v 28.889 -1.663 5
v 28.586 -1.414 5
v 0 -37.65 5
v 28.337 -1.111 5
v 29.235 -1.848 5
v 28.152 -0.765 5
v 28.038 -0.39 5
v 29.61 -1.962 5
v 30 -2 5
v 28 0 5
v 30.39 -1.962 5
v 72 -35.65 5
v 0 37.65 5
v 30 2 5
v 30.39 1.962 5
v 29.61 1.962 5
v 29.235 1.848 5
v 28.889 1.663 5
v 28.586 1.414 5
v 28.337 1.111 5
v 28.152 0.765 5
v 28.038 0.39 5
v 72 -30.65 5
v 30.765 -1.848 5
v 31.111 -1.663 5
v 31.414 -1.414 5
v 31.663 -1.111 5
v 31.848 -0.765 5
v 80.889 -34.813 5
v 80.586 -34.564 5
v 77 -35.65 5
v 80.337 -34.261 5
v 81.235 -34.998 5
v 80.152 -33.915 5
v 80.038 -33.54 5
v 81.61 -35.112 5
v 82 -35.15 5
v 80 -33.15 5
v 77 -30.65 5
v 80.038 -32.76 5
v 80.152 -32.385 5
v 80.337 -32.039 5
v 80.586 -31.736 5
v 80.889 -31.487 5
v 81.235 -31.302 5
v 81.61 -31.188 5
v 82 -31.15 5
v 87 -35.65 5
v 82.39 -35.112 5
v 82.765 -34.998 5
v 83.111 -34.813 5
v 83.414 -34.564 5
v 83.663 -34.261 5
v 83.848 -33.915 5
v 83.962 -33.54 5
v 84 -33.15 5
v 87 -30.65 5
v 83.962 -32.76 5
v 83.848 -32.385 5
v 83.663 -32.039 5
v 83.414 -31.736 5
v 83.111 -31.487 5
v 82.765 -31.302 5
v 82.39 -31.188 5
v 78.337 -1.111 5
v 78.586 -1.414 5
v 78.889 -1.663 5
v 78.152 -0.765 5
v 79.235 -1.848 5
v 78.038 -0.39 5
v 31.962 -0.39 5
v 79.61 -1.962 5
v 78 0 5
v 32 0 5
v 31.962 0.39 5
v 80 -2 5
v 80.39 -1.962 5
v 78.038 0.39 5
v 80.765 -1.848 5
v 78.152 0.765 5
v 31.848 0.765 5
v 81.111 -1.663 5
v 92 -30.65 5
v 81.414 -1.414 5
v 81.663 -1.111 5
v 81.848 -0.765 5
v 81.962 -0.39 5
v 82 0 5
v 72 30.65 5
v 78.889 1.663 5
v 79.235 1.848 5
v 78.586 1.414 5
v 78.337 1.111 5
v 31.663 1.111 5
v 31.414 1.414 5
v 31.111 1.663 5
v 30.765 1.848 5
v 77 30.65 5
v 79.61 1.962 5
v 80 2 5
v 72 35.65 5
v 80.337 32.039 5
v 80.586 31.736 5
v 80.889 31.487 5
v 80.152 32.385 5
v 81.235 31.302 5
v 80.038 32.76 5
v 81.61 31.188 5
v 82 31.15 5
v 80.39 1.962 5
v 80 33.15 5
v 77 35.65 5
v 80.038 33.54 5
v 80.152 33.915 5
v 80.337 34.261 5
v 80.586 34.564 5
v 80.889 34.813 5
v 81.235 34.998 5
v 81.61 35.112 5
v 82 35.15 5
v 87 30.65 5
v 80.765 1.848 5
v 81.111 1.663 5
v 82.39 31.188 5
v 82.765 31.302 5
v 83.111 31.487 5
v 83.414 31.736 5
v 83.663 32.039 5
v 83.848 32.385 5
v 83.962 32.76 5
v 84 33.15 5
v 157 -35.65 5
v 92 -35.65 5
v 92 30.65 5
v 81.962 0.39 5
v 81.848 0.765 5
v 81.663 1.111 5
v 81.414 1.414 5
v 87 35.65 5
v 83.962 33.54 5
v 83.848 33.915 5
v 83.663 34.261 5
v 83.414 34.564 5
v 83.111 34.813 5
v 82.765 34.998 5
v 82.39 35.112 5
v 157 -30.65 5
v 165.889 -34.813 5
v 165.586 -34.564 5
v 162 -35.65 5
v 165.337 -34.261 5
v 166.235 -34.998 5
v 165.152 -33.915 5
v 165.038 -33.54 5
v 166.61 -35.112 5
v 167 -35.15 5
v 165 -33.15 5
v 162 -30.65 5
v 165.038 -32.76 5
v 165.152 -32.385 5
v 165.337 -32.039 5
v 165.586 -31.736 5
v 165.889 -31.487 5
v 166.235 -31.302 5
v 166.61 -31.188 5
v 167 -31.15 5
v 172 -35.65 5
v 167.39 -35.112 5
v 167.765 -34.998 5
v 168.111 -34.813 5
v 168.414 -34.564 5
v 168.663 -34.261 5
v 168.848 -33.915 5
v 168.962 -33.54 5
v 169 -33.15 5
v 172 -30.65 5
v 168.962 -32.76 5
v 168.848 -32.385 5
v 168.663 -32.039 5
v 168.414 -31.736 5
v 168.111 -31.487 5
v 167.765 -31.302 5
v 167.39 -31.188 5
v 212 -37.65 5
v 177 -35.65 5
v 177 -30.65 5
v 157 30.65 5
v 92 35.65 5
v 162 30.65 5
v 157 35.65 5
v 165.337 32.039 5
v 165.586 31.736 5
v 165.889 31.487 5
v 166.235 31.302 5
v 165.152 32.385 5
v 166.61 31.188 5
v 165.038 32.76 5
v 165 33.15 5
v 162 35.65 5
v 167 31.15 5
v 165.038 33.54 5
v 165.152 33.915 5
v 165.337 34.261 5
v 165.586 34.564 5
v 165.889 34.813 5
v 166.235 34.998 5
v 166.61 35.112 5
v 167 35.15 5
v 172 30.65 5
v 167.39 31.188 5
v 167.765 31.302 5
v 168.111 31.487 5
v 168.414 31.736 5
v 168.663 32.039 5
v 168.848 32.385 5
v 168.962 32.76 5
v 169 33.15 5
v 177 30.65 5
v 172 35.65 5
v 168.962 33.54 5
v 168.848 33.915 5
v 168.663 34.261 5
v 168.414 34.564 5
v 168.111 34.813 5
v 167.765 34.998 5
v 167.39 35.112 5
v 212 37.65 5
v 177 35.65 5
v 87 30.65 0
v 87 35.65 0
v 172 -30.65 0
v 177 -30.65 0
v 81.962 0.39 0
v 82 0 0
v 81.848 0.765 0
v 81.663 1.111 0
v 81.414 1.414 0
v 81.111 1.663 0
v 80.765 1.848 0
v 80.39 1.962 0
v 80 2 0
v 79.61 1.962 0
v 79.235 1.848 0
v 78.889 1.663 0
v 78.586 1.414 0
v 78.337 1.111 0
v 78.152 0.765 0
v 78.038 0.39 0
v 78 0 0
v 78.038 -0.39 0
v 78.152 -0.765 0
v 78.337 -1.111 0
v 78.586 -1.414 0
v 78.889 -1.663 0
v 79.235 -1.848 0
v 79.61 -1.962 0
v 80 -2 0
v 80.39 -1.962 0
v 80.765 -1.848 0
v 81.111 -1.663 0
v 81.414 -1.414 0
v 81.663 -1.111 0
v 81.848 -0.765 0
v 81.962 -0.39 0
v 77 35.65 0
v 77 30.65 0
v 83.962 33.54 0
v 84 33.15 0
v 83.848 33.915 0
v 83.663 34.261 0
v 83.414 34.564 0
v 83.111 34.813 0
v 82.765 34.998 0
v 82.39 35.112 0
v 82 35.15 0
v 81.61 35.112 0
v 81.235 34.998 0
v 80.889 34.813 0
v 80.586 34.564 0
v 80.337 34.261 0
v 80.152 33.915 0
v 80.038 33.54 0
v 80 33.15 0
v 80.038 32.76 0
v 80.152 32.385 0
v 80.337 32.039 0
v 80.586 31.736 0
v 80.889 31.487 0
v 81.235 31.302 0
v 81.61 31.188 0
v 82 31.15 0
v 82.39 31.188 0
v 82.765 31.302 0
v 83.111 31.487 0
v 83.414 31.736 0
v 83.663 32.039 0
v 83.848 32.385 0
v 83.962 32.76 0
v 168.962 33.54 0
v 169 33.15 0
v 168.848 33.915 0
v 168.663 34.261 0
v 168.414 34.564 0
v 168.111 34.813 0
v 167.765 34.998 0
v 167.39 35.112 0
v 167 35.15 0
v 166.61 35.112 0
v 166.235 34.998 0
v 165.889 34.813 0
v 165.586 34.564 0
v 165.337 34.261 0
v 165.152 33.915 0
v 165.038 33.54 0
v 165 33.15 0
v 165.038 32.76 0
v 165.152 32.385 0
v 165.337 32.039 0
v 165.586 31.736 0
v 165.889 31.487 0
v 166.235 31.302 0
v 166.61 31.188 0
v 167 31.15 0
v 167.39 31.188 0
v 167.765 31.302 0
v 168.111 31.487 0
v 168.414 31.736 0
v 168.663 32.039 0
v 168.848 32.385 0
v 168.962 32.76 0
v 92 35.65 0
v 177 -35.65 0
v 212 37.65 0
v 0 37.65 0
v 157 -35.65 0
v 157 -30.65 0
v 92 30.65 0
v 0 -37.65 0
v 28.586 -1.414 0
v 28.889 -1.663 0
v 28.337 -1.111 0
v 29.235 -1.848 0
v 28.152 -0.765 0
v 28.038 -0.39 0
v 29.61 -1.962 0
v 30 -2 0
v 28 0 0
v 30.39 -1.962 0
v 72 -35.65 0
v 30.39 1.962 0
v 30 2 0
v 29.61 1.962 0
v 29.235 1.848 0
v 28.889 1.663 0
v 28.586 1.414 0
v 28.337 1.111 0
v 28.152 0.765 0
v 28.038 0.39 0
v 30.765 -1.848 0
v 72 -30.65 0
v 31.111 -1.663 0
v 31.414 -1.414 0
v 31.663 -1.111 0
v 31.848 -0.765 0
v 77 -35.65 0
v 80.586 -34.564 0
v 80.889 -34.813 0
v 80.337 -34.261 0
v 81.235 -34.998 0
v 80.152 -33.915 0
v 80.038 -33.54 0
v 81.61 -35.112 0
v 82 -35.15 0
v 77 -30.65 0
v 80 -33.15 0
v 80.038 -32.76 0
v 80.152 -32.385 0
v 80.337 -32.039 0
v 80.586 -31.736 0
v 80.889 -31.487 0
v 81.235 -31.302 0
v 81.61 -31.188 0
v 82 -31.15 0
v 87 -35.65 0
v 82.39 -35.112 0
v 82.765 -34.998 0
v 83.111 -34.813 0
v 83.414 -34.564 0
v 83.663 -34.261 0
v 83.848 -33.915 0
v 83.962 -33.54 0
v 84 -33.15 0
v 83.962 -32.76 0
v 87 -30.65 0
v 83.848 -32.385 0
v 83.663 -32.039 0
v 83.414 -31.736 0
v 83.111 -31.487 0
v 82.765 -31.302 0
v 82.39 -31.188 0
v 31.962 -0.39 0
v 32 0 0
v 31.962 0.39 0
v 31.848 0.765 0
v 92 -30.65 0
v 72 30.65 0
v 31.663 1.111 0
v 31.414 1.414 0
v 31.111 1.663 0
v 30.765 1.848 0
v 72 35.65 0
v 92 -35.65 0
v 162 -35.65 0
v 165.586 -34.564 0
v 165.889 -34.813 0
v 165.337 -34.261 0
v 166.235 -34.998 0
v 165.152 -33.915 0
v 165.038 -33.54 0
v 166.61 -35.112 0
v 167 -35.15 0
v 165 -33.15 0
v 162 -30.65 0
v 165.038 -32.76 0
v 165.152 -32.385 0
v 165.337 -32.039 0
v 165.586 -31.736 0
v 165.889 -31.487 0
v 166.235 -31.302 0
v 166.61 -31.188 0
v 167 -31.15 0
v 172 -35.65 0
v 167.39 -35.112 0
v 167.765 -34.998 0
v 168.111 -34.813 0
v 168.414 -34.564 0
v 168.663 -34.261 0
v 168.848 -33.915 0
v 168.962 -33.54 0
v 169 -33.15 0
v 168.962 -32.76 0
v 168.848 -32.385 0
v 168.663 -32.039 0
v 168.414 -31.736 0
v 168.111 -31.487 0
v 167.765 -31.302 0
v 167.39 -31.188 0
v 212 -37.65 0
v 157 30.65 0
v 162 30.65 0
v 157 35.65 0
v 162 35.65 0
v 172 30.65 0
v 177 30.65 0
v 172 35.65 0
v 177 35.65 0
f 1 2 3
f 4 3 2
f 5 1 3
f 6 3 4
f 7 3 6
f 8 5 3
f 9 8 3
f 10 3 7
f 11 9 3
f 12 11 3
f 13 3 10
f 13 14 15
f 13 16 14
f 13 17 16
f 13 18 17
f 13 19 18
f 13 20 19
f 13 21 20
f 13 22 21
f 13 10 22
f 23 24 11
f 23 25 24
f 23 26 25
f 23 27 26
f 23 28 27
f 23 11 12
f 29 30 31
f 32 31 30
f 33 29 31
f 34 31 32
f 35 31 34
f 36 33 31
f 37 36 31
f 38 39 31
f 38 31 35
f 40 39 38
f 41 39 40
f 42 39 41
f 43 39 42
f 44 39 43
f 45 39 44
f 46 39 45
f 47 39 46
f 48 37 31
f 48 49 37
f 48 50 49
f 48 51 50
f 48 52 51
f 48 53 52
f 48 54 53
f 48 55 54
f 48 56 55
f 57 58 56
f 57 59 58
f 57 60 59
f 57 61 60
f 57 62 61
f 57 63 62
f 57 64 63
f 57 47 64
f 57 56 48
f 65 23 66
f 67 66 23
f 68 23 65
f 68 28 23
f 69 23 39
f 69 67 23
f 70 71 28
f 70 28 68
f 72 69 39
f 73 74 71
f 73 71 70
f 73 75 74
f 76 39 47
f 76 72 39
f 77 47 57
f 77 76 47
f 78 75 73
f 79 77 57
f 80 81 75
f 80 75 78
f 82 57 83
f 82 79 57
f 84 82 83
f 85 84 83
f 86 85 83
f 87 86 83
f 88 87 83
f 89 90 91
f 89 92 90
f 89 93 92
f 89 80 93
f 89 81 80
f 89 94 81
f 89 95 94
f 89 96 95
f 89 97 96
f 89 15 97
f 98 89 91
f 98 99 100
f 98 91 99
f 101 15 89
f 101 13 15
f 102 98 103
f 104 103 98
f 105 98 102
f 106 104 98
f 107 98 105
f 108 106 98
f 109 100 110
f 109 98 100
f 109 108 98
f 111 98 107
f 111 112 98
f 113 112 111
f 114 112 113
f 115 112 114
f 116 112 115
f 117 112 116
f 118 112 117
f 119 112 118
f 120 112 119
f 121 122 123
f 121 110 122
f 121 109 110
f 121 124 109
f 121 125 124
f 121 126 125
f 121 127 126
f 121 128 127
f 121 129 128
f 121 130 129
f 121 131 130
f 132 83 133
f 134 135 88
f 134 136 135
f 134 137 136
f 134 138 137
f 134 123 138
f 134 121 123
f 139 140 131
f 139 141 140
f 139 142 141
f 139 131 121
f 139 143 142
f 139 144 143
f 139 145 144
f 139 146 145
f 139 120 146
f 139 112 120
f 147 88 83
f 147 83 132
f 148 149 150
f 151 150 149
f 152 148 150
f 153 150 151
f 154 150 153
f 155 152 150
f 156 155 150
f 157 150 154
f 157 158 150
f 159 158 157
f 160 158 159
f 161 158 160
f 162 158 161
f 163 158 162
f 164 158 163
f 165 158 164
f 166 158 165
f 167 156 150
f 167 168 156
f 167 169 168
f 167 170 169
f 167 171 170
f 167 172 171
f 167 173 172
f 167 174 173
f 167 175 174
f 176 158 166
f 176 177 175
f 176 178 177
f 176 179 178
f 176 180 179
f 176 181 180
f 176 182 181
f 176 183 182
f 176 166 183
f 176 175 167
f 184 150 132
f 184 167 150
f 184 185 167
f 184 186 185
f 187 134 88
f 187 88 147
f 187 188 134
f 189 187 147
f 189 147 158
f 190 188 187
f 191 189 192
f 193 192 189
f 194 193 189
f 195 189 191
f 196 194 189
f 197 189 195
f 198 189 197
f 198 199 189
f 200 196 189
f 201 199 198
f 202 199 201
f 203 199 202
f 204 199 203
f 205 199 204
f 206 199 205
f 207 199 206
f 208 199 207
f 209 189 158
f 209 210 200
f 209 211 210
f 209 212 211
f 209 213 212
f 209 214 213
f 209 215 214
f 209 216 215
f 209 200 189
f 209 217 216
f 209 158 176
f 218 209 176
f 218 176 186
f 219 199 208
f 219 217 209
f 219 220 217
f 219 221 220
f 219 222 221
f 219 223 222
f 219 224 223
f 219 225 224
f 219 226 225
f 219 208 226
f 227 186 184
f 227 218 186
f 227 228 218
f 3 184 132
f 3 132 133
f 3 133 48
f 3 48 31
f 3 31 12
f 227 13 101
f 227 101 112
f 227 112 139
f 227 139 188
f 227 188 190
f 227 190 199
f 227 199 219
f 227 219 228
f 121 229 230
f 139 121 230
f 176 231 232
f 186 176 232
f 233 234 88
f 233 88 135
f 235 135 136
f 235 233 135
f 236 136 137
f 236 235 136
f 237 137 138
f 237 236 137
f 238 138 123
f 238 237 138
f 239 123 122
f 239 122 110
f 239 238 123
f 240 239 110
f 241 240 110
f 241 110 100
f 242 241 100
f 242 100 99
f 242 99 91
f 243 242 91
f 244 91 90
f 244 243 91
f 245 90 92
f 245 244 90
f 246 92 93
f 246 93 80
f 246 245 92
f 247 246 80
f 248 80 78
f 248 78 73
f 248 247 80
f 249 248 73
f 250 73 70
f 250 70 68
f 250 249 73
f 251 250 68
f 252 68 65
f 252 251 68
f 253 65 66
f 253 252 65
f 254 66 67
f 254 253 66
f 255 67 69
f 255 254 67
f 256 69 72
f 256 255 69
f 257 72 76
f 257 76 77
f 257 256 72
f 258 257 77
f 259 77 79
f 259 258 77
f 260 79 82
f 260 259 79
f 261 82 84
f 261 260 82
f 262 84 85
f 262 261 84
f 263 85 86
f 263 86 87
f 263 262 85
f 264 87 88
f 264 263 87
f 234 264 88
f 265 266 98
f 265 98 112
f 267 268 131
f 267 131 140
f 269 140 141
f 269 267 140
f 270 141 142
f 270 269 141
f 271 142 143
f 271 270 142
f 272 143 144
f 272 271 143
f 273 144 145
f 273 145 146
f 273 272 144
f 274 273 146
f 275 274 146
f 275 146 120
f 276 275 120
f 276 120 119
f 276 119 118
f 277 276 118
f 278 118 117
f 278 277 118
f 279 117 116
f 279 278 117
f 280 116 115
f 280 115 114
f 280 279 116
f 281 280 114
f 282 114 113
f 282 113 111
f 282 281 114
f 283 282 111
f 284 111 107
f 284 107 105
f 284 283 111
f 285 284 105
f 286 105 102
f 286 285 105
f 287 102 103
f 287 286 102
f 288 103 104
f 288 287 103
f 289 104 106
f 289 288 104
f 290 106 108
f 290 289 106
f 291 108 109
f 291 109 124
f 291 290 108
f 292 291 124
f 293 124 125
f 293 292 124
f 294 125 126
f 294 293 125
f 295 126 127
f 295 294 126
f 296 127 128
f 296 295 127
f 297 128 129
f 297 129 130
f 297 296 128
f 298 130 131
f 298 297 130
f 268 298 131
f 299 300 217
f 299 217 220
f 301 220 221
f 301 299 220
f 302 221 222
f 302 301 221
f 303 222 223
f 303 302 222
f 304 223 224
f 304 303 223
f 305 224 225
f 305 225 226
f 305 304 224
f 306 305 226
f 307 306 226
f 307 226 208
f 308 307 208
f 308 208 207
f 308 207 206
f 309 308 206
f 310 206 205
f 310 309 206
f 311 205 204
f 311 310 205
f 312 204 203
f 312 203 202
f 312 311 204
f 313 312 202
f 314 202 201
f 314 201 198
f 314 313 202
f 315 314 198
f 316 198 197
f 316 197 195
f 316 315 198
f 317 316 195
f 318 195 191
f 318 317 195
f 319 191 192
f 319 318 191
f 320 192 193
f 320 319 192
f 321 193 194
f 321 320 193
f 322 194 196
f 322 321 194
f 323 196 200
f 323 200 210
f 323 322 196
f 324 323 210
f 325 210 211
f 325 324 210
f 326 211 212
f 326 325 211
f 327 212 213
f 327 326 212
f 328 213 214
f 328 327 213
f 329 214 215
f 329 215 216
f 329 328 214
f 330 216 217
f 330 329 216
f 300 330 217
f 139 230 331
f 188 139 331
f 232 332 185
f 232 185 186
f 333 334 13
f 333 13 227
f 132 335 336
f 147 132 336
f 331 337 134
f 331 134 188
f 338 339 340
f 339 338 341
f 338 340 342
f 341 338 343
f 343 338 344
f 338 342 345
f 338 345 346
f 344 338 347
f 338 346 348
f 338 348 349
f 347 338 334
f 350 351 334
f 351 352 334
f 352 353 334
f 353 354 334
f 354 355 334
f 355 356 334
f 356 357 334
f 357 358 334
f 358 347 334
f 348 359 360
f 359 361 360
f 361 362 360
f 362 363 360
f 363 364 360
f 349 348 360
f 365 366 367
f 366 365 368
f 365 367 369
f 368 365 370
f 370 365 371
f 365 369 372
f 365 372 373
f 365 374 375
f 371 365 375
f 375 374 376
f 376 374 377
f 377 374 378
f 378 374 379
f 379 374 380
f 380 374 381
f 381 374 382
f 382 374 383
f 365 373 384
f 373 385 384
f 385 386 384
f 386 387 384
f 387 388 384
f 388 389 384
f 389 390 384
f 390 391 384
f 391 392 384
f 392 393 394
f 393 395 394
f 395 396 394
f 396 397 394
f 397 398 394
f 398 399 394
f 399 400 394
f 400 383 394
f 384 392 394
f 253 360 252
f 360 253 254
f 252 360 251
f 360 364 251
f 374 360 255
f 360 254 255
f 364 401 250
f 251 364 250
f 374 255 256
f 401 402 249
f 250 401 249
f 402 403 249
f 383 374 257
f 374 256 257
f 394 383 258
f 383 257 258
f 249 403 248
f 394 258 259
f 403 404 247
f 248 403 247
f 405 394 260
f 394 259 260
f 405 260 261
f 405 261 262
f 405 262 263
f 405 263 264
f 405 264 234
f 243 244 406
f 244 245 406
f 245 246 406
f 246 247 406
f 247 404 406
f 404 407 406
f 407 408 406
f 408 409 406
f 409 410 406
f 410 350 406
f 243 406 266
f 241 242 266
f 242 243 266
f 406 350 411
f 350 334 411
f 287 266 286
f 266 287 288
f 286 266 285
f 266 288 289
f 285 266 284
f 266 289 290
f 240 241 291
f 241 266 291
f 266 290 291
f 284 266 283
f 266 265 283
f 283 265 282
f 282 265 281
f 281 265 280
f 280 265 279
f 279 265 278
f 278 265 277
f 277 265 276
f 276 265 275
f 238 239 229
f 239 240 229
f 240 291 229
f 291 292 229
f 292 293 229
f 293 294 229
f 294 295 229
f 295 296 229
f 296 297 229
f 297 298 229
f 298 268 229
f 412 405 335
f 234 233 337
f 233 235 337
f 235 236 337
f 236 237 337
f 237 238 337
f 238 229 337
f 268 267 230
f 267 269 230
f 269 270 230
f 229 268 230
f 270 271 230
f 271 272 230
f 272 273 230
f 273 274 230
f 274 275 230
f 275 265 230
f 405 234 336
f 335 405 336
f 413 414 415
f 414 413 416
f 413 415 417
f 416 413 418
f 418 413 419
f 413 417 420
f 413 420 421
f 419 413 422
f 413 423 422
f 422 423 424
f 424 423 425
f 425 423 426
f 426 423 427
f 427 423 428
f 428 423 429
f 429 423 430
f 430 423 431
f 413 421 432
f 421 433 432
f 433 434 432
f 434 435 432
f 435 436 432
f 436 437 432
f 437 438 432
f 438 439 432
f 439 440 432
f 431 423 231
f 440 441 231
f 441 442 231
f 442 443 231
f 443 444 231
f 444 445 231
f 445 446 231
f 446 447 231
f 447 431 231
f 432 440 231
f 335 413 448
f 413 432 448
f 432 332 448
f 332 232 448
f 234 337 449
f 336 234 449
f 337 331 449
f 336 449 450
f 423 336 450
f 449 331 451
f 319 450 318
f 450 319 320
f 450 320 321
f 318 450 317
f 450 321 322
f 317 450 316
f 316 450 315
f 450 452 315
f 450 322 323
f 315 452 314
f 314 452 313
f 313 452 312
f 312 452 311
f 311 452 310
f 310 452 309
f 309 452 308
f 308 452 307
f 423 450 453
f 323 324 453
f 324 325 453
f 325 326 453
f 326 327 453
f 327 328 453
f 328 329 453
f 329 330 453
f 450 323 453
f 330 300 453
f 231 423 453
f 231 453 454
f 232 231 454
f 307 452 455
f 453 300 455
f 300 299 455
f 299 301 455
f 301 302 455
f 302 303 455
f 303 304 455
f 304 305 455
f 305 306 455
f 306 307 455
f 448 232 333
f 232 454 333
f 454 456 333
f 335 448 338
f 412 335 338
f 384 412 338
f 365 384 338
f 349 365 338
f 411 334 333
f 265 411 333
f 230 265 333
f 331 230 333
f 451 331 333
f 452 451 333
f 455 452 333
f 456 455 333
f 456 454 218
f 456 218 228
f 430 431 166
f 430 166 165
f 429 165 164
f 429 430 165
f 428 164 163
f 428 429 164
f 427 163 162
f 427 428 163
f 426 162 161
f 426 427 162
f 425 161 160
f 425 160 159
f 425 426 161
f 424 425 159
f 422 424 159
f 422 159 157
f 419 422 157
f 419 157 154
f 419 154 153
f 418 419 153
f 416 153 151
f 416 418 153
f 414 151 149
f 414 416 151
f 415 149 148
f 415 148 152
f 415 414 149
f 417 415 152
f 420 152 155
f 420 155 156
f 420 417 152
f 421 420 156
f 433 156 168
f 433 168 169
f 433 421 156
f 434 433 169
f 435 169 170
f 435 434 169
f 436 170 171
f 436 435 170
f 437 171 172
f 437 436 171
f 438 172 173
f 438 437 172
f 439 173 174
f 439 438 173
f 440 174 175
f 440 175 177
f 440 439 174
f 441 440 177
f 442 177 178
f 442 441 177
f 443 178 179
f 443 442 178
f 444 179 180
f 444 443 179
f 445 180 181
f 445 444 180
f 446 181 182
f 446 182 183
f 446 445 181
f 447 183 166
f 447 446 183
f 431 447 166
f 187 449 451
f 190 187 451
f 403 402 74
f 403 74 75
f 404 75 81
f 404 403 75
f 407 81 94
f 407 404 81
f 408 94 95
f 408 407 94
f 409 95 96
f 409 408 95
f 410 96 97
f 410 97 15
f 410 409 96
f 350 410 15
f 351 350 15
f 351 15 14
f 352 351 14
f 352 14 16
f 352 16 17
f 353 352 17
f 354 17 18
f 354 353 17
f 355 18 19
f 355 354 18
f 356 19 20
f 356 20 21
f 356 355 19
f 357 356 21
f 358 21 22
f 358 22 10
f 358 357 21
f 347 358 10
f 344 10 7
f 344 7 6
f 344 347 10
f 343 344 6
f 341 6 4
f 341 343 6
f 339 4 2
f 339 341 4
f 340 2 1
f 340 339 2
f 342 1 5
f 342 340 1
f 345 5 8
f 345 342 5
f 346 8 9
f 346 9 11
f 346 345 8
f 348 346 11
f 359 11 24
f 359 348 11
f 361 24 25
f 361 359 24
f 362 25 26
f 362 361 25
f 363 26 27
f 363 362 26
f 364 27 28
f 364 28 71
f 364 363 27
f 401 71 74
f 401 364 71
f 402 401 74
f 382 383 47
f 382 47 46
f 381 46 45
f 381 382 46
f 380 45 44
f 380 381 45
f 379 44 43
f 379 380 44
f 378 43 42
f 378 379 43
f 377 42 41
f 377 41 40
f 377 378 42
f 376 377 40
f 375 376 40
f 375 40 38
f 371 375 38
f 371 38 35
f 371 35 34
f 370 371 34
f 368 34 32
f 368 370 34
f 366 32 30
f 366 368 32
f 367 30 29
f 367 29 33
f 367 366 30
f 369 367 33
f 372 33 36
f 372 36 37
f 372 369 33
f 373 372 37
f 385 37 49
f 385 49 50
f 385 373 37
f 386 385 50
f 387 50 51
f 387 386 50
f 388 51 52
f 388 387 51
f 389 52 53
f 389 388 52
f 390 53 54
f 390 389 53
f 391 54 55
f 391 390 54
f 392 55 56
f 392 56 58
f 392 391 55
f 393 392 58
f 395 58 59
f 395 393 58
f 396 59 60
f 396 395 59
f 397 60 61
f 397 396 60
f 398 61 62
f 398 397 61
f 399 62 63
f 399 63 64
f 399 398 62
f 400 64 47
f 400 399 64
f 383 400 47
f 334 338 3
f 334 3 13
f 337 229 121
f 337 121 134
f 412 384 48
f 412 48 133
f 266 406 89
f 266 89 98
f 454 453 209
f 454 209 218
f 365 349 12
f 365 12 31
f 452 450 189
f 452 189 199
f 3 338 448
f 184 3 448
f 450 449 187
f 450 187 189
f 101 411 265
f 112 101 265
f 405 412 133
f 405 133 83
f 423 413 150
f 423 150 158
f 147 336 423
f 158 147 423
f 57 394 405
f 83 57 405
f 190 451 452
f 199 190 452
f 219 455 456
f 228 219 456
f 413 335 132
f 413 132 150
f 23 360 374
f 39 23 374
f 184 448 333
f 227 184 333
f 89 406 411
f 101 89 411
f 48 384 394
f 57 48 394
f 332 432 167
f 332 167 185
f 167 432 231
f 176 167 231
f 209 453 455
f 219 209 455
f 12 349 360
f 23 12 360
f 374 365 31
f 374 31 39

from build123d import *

# Parameters (mm, degrees)
ESQUISSE1_W        = 212
ESQUISSE1_H        = 75.3
ESQUISSE1_R        = 2
ESQUISSE1_W_2      = 5
ESQUISSE1_H_2      = 5
BOSS_EXTRU_1_DEPTH = 5


with BuildPart() as part:
    # Esquisse1 → Boss.-Extru.1 (new body)
    with BuildSketch(Plane.XY):
        with Locations((106, 0)):
            Rectangle(ESQUISSE1_W, ESQUISSE1_H)
        with Locations((30, 0)):
            Circle(ESQUISSE1_R, mode=Mode.SUBTRACT)
        with Locations((80, 0)):
            Circle(ESQUISSE1_R, mode=Mode.SUBTRACT)
        with Locations((82, 33.15)):
            Circle(ESQUISSE1_R, mode=Mode.SUBTRACT)
        with Locations((167, 33.15)):
            Circle(ESQUISSE1_R, mode=Mode.SUBTRACT)
        with Locations(Location((167, -33.15, 0), (0, 0, 90))):
            Circle(ESQUISSE1_R, mode=Mode.SUBTRACT)
        with Locations(Location((82, -33.15, 0), (0, 0, 90))):
            Circle(ESQUISSE1_R, mode=Mode.SUBTRACT)
        with Locations((74.5, 33.15)):
            Rectangle(ESQUISSE1_W_2, ESQUISSE1_H_2, mode=Mode.SUBTRACT)
        with Locations((89.5, 33.15)):
            Rectangle(ESQUISSE1_W_2, ESQUISSE1_H_2, mode=Mode.SUBTRACT)
        with Locations((159.5, 33.15)):
            Rectangle(ESQUISSE1_W_2, ESQUISSE1_H_2, mode=Mode.SUBTRACT)
        with Locations((174.5, 33.15)):
            Rectangle(ESQUISSE1_W_2, ESQUISSE1_H_2, mode=Mode.SUBTRACT)
        with Locations((159.5, -33.15)):
            Rectangle(ESQUISSE1_W_2, ESQUISSE1_H_2, mode=Mode.SUBTRACT)
        with Locations((174.5, -33.15)):
            Rectangle(ESQUISSE1_W_2, ESQUISSE1_H_2, mode=Mode.SUBTRACT)
        with Locations((74.5, -33.15)):
            Rectangle(ESQUISSE1_W_2, ESQUISSE1_H_2, mode=Mode.SUBTRACT)
        with Locations((89.5, -33.15)):
            Rectangle(ESQUISSE1_W_2, ESQUISSE1_H_2, mode=Mode.SUBTRACT)
    extrude(amount=BOSS_EXTRU_1_DEPTH)


solid = part.part
